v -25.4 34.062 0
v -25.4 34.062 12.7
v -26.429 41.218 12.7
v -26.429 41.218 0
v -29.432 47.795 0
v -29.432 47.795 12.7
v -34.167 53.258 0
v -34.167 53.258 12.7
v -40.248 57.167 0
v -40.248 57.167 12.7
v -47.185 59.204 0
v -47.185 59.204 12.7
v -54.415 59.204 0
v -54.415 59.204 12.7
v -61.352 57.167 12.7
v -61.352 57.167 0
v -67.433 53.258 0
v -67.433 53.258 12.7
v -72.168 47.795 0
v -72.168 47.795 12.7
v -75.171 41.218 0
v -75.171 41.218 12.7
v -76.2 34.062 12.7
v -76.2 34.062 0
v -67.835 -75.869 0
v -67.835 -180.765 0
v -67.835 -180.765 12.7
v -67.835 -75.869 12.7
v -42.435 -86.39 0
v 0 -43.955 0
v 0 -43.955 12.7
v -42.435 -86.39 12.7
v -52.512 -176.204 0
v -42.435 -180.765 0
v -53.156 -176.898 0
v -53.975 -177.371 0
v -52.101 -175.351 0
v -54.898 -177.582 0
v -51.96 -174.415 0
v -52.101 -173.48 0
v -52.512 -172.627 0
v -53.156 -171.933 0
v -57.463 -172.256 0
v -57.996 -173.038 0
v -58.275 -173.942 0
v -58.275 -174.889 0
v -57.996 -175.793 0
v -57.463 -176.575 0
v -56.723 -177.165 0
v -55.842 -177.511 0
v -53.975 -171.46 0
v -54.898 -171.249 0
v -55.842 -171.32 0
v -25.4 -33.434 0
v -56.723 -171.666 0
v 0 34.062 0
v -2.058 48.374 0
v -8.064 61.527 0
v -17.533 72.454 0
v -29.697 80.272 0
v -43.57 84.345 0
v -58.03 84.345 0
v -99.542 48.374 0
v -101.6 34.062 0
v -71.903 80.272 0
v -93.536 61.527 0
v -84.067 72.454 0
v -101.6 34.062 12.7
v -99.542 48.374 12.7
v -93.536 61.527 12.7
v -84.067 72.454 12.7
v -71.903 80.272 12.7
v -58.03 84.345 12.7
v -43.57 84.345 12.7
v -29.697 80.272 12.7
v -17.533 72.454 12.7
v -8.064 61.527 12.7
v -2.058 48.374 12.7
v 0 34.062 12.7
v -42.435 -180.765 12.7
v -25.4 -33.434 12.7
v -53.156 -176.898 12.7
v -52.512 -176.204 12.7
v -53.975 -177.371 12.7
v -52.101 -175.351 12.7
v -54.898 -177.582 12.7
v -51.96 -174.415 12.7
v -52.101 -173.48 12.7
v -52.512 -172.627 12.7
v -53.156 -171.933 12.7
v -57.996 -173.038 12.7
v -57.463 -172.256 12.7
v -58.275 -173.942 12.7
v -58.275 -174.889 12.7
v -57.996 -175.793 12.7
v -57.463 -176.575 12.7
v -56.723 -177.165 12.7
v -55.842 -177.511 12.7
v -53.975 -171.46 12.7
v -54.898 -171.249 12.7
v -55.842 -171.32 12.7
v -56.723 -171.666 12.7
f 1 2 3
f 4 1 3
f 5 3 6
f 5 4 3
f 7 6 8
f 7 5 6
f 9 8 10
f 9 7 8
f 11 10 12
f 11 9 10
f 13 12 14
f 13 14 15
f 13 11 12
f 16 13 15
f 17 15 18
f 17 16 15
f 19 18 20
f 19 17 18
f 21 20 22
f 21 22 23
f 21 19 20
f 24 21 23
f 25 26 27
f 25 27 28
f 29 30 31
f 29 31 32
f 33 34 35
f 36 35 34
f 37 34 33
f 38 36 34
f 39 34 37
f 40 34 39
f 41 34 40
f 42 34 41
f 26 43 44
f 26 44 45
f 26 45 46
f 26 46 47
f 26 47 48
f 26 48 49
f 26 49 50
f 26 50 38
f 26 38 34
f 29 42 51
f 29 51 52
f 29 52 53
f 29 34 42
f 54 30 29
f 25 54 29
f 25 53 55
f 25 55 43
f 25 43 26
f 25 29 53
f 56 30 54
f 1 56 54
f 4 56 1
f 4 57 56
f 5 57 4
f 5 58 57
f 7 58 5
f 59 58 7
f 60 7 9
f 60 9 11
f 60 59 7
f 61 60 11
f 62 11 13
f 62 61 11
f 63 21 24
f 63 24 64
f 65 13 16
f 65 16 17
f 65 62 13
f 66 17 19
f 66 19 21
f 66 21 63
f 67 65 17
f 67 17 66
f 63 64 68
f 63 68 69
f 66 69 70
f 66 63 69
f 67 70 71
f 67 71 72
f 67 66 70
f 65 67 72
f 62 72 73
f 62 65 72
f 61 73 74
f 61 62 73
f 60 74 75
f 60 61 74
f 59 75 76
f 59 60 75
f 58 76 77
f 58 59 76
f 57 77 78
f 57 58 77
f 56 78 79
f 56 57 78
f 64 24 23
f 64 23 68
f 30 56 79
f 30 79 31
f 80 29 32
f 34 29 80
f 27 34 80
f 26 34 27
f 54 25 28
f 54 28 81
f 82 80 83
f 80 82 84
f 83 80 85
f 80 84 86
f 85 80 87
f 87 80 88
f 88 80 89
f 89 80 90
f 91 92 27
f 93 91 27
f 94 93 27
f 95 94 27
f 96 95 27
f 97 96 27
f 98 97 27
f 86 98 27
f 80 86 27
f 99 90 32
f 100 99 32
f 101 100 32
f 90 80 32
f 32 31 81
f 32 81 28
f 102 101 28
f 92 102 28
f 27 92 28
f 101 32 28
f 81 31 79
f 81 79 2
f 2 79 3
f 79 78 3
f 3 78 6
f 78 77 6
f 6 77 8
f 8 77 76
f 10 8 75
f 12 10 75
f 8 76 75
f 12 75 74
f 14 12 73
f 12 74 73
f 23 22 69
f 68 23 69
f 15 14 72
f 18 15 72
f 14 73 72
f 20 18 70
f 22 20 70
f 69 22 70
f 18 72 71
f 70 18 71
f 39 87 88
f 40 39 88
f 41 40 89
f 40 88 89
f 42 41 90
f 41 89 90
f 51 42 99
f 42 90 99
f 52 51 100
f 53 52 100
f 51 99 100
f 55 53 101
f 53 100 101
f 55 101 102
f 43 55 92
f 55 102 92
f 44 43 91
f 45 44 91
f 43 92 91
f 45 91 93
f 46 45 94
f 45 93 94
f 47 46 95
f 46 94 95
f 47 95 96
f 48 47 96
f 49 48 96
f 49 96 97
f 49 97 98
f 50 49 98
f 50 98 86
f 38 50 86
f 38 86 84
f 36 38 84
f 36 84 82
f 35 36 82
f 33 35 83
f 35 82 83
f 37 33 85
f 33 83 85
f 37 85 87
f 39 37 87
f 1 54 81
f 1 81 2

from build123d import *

# Parameters (mm, degrees)
BOSS_EXTRUDE1_DEPTH = 12.7
SKETCH2_R           = 3.175
CUT_EXTRUDE1_DEPTH  = 12.7


with BuildPart() as part:
    # Sketch1 → Boss-Extrude1 (new body)
    with BuildSketch(Plane.XY):
        with BuildLine():
            Line((-25.4, 6.391326247), (-25.4, 34.062325918))
            ThreePointArc((-25.4, 34.062325918), (-50.8, 59.462325918), (-76.2, 34.062325918))
            Line((-76.2, 34.062325918), (-101.6, 34.062325918))
            ThreePointArc((-101.6, 34.062325918), (-50.8, 84.862325918), (0, 34.062325918))
            Line((0, 34.062325918), (0, 0))
            Line((0, 0), (0, -43.954875224))
            Line((0, -43.954875224), (-42.435391943, -86.390267166))
            Line((-42.435391943, -86.390267166), (-42.435391943, -180.765389634))
            Line((-42.435391943, -180.765389634), (-67.835391943, -180.765389634))
            Line((-67.835391943, -180.765389634), (-67.835391943, -100.403593512))
            Line((-67.835391943, -100.403593512), (-67.835391943, -75.869242682))
            Line((-67.835391943, -75.869242682), (-25.4, -33.433850739))
            Line((-25.4, -33.433850739), (-25.4, 6.391326247))
        make_face()
    extrude(amount=BOSS_EXTRUDE1_DEPTH)

    # Sketch2 → Cut-Extrude1 (cut)
    with BuildSketch(Plane.XY.offset(12.7)):
        with Locations((-55.135391943, -174.415389634)):
            Circle(SKETCH2_R)
    extrude(amount=-CUT_EXTRUDE1_DEPTH, mode=Mode.SUBTRACT)


solid = part.part
